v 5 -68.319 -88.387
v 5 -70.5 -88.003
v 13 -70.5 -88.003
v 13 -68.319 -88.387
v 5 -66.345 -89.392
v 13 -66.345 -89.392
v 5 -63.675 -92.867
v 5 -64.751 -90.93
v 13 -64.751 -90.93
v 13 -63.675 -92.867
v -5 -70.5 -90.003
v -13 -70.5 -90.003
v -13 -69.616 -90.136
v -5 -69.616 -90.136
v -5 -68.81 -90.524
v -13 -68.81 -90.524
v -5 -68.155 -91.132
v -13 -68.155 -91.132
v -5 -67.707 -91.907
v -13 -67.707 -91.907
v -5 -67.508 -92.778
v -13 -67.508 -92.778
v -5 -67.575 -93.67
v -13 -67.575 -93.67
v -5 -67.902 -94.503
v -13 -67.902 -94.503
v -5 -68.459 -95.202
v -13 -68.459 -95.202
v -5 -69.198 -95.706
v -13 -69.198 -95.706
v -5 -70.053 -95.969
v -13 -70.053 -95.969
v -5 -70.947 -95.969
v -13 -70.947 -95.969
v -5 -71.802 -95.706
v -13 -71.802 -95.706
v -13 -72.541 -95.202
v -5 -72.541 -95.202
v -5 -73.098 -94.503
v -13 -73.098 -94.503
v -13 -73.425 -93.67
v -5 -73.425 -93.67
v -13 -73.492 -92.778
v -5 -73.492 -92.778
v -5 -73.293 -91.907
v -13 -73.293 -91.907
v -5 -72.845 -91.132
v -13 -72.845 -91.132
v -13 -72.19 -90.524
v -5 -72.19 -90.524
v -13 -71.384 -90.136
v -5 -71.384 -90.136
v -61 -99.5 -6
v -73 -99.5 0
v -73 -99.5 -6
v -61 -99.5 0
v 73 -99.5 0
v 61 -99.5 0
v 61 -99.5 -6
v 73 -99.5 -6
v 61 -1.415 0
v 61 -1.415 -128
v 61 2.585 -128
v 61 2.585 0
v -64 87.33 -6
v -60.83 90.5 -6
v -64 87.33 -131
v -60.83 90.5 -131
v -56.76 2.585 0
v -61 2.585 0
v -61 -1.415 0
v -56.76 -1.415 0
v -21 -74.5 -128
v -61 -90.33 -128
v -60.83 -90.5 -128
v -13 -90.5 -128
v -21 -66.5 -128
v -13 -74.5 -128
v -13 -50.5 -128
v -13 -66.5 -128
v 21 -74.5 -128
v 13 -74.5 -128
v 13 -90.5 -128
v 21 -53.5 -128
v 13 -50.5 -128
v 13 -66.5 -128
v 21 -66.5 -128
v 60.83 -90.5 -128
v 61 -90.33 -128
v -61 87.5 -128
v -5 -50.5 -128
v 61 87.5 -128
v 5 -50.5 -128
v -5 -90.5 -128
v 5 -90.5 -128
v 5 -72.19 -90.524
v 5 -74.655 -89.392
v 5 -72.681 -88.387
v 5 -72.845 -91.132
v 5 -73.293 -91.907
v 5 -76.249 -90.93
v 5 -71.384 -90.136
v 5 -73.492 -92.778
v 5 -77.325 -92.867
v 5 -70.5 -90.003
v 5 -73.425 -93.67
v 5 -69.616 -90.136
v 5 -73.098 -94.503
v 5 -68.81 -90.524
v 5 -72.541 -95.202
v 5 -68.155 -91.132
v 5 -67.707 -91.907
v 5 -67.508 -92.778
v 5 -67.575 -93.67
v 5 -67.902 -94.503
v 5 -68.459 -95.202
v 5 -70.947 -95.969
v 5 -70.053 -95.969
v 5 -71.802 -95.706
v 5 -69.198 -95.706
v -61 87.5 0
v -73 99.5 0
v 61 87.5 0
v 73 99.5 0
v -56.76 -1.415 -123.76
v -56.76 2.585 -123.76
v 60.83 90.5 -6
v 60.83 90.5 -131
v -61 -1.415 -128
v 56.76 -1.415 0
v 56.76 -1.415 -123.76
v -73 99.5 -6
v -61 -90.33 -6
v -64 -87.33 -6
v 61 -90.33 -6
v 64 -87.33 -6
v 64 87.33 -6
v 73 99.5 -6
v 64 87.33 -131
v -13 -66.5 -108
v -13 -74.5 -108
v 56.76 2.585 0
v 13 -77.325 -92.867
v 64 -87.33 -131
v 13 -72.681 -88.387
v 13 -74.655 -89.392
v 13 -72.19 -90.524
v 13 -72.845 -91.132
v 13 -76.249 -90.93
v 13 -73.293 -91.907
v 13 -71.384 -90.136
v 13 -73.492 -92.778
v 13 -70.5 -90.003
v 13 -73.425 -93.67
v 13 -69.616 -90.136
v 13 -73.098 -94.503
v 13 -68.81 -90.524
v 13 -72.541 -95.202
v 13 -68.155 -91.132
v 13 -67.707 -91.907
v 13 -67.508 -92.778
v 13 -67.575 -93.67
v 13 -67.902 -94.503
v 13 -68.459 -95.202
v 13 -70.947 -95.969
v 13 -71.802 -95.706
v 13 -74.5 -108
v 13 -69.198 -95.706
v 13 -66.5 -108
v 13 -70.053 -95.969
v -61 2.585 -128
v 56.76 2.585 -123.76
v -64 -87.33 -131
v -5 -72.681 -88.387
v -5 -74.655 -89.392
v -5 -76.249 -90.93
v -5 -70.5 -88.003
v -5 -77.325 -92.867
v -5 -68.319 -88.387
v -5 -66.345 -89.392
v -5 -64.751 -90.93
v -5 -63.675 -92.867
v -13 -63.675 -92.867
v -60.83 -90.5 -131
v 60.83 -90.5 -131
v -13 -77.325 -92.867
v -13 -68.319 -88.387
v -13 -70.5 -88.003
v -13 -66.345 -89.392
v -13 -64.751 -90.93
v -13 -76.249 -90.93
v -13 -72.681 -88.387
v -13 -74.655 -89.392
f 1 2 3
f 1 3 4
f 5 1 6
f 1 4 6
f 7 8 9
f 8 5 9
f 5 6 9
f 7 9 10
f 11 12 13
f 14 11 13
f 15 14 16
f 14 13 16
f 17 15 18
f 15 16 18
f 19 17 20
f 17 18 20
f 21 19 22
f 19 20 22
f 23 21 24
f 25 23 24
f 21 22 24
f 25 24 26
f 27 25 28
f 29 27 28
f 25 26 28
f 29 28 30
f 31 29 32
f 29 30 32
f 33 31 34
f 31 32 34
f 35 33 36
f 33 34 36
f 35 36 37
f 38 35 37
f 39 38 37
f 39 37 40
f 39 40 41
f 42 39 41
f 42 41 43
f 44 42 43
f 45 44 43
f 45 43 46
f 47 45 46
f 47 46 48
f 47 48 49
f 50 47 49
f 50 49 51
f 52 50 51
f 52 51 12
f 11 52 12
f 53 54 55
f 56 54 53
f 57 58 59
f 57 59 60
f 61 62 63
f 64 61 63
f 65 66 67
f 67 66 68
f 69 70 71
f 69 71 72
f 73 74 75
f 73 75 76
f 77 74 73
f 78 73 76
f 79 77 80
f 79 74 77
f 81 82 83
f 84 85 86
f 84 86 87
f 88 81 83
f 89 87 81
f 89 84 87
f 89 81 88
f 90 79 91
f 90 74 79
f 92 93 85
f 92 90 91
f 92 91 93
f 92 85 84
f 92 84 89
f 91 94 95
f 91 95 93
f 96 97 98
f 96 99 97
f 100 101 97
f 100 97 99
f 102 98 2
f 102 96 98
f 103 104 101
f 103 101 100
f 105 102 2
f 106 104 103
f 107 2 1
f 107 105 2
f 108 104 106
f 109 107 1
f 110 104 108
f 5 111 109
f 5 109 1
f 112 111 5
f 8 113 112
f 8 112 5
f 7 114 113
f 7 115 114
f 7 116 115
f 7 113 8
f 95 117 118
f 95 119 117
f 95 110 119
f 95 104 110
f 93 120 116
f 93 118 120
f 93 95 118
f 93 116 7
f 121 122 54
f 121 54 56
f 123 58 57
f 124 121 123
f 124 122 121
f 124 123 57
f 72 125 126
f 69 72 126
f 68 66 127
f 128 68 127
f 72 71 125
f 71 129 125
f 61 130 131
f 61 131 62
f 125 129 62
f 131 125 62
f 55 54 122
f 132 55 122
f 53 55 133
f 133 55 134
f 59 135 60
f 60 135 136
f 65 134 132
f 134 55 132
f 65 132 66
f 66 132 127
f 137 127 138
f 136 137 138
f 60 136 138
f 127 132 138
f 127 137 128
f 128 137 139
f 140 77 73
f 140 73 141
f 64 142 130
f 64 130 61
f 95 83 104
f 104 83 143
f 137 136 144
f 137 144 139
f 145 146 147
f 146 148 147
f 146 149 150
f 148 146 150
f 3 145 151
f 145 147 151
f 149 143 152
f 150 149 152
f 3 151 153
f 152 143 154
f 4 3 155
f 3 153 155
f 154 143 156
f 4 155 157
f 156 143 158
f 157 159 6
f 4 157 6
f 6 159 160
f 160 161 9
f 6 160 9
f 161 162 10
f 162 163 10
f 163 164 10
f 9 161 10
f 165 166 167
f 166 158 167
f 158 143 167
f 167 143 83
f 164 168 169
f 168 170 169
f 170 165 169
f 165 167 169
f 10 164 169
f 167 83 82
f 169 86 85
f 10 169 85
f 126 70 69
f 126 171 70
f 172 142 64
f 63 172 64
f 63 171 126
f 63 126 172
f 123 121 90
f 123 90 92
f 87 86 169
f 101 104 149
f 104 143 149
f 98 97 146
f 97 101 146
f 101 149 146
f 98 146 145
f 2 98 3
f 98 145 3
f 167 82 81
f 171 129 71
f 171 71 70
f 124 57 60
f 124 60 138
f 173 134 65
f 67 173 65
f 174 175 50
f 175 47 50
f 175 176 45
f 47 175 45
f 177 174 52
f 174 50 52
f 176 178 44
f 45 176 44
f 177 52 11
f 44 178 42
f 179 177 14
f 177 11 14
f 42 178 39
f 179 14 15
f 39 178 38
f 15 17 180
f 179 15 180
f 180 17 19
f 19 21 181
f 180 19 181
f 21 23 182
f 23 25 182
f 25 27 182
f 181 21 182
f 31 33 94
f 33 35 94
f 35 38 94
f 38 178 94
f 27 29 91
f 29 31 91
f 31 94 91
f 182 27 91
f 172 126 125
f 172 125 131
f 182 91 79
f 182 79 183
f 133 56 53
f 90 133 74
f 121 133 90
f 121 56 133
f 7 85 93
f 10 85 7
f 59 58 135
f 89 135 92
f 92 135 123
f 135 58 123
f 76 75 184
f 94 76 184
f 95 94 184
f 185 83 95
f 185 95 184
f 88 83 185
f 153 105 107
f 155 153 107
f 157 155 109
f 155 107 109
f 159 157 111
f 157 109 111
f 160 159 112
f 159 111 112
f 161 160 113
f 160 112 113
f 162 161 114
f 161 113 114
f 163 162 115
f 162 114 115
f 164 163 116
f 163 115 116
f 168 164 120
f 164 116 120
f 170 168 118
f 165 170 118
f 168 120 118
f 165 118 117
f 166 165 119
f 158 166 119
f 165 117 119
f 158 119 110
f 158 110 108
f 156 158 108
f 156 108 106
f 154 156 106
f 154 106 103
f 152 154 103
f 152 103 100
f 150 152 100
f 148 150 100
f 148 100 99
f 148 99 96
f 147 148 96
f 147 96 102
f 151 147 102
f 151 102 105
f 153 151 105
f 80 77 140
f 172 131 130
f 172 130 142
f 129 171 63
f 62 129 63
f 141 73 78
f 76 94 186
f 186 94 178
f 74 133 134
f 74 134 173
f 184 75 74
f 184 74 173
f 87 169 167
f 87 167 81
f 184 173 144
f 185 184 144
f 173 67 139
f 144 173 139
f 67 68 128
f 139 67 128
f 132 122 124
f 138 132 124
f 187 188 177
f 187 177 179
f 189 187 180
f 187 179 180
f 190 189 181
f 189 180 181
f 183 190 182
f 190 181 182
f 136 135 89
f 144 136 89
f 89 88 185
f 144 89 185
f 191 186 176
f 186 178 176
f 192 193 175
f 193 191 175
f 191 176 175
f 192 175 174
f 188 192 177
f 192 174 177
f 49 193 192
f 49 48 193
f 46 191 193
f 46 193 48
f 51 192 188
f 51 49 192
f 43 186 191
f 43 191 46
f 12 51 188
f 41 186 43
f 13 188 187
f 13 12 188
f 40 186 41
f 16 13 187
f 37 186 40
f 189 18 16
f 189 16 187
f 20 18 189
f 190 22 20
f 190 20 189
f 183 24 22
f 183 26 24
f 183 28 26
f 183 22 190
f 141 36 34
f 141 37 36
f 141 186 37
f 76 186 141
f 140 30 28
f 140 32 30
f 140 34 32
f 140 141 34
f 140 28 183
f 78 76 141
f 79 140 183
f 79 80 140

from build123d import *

# Parameters (mm, degrees)
ESQUISSE3_W                  = 128
ESQUISSE3_H                  = 181
BOSS_EXTRU_4_DEPTH           = 131
COQUE2_T                     = -3
CHANFREIN1_SIZE              = 3.17
ESQUISSE4_W                  = 146
ESQUISSE4_H                  = 199
BOSS_EXTRU_5_DEPTH           = 6
ESQUISSE5_W                  = 122
ESQUISSE5_H                  = 9.17
ENL_V_MAT_EXTRU_1_DEPTH      = 6
ESQUISSE6_W                  = 8
ESQUISSE6_H                  = 40
BOSS_EXTRU_6_DEPTH           = 40
ENL_V_MAT_EXTRU_2_DEPTH      = 26
CONG_2_R                     = 7.5
ENL_V_MAT_EXTRU_3_REACH      = 187.627
ESQUISSE8_R                  = 3
ESQUISSE9_W                  = 122
ESQUISSE9_H                  = 4
BOSS_EXTRU_7_DEPTH           = 128
COQUE3_T                     = -4.24
ESQUISSE10_W                 = 8
ESQUISSE10_H                 = 8
BOSS_EXTRU_8_DEPTH           = 20
ENL_V_MAT_EXTRU_4_DEPTH      = 230.708510944
ENL_V_MAT_EXTRU_4_DEPTH_BACK = 21
ESQUISSE12_W                 = 8
ESQUISSE12_H                 = 8
BOSS_EXTRU_9_DEPTH           = 20
ENL_V_START                  = -8
ENL_V_MAT_EXTRU_6_DEPTH      = 8


# Read off the part's stored shape, not the designer's step: Enlèv. mat.-Extru.6
with BuildPart() as part:
    # Esquisse3 → Boss.-Extru.4 (new body)
    with BuildSketch(Plane.XY):
        Rectangle(ESQUISSE3_W, ESQUISSE3_H)
    extrude(amount=-BOSS_EXTRU_4_DEPTH)

    # Coque2
    coque2_openings = [part.faces().sort_by_distance(p)[0] for p in [
        (0, 0, 0),
        (0, -90.5, -65.5),
    ]]
    offset(amount=COQUE2_T, openings=coque2_openings, kind=Kind.INTERSECTION)

    # Chanfrein1
    chanfrein1_edges = [part.edges().sort_by_distance(p)[0] for p in [
        (64, -90.5, -65.5),
        (-64, -90.5, -65.5),
        (-64, 90.5, -65.5),
        (64, 90.5, -65.5),
    ]]
    chamfer(chanfrein1_edges, length=CHANFREIN1_SIZE)

    # Esquisse4 → Boss.-Extru.5 (add)
    with BuildSketch(Plane.XY):
        Rectangle(ESQUISSE4_W, ESQUISSE4_H)
        Polygon((-64, 87.33), (-60.83, 90.5), (60.83, 90.5), (64, 87.33), (64, -87.33), (61, -90.33), (-61, -90.33), (-64, -87.33), align=None, mode=Mode.SUBTRACT)
    extrude(amount=-BOSS_EXTRU_5_DEPTH)

    # Esquisse5 → Enlèv. mat.-Extru.1 (cut)
    with BuildSketch(Plane.XY):
        with Locations((0, -94.915)):
            Rectangle(ESQUISSE5_W, ESQUISSE5_H)
    extrude(amount=-ENL_V_MAT_EXTRU_1_DEPTH, mode=Mode.SUBTRACT)

    # Esquisse6 → Boss.-Extru.6 (add)
    with BuildSketch(Plane.XY.offset(-128)):
        with Locations((9, -70.5)):
            Rectangle(ESQUISSE6_W, ESQUISSE6_H)
        with Locations((-9, -70.5)):
            Rectangle(ESQUISSE6_W, ESQUISSE6_H)
    extrude(amount=BOSS_EXTRU_6_DEPTH)

    # Esquisse7 → Enlèv. mat.-Extru.2 (cut)
    with BuildSketch(Plane(origin=(13, 0, 0), x_dir=(0, 0, -1), z_dir=(1, 0, 0))):
        Polygon((128, -50.5), (88, -65.5), (88, -50.5), align=None)
        Polygon((128, -90.5), (88, -75.5), (88, -90.5), align=None)
    extrude(amount=-ENL_V_MAT_EXTRU_2_DEPTH, mode=Mode.SUBTRACT)

    # Congé2
    # the kernel refuses this fillet: 7.5 mm, written as the material it takes off along each edge
    with BuildSketch(Plane(origin=(25.993758778, -75.5, -88), x_dir=(0, -0.3511234415883899, -0.9363291775690452), z_dir=(-1, 0, 0)), Plane(origin=(7.993758778, -75.5, -88), x_dir=(0, -0.3511234415883899, -0.9363291775690452), z_dir=(-1, 0, 0))) as cong_2_piece_1:
        with BuildLine():
            CenterArc((CONG_2_R * 0.693000468165, -CONG_2_R), CONG_2_R, 90, 69.44395478)
            Line((-CONG_2_R * 0.243328709404, -CONG_2_R * 0.648876558412), (0, 0))
            Line((0, 0), (CONG_2_R * 0.693000468165, 0))
        make_face()
    extrude(amount=33.987517556, mode=Mode.SUBTRACT)
    with BuildSketch(Plane(origin=(7.993758778, -65.5, -88), x_dir=(0, 0.3511234415883905, -0.936329177569045), z_dir=(-1, 0, 0)), Plane(origin=(25.993758778, -65.5, -88), x_dir=(0, 0.3511234415883905, -0.936329177569045), z_dir=(-1, 0, 0))) as cong_2_piece_2:
        with BuildLine():
            CenterArc((CONG_2_R * 0.693000468165, CONG_2_R), CONG_2_R, 200.55604522, 69.44395478)
            Line((-CONG_2_R * 0.243328709404, CONG_2_R * 0.648876558412), (0, 0))
            Line((0, 0), (CONG_2_R * 0.693000468165, 0))
        make_face()
    extrude(amount=33.987517556, mode=Mode.SUBTRACT)

    # Enlèv. mat.-Extru.3: up to this face of the body (flat: up to its plane)
    enl_v_mat_extru_3_end = Plane(part.part.faces().sort_by_distance((13, -70.5, -112.226918248))[0])
    # Esquisse8 → Enlèv. mat.-Extru.3 (cut, up to the picked face)
    with BuildSketch(Plane.ZY.offset(13), mode=Mode.PRIVATE) as enl_v_mat_extru_3_sk1:
        with Locations((-93.00260096, -70.5)):
            Circle(ESQUISSE8_R)
    enl_v_mat_extru_3_tool1 = split(extrude(enl_v_mat_extru_3_sk1.sketch, amount=-ENL_V_MAT_EXTRU_3_REACH, mode=Mode.PRIVATE), bisect_by=enl_v_mat_extru_3_end, keep=Keep.BOTH, mode=Mode.PRIVATE)
    add(enl_v_mat_extru_3_tool1.solids().sort_by(Axis((-13, -70.5, -93.002601), (1, 0, 0)))[0], mode=Mode.SUBTRACT)

    # Esquisse10 → Boss.-Extru.8 (add)
    with BuildSketch(Plane.XY.offset(-128)):
        with Locations((17, -70.5)):
            Rectangle(ESQUISSE10_W, ESQUISSE10_H)
    extrude(amount=BOSS_EXTRU_8_DEPTH)

    # Esquisse11 → Enlèv. mat.-Extru.4 (cut, two sides: drawn at the far end of the back side and taken through both)
    with BuildSketch(Plane.XZ.offset(74.5).offset(-ENL_V_MAT_EXTRU_4_DEPTH_BACK)):
        Polygon((21, -108), (13, -108), (21, -128), align=None)
    extrude(amount=ENL_V_MAT_EXTRU_4_DEPTH + ENL_V_MAT_EXTRU_4_DEPTH_BACK, mode=Mode.SUBTRACT)

    # Esquisse12 → Boss.-Extru.9 (add)
    with BuildSketch(Plane.XY.offset(-128)):
        with Locations((-17, -70.5)):
            Rectangle(ESQUISSE12_W, ESQUISSE12_H)
    extrude(amount=BOSS_EXTRU_9_DEPTH)

    # Enlèv. mat.-Extru.6 outline → Enlèv. mat.-Extru.6 (cut)
    with BuildSketch(Plane.XZ.offset(74.5).offset(ENL_V_START)):
        Polygon((-21, -108), (-21, -128), (-13, -108), align=None)
    extrude(amount=ENL_V_MAT_EXTRU_6_DEPTH, mode=Mode.SUBTRACT)


with BuildPart() as body_2:
    # Esquisse9 → Boss.-Extru.7 (new body)
    with BuildSketch(Plane.XY.offset(-128)):
        with Locations((0, 0.585)):
            Rectangle(ESQUISSE9_W, ESQUISSE9_H)
    extrude(amount=BOSS_EXTRU_7_DEPTH)

    # Coque3
    coque3_openings = [body_2.faces().sort_by_distance(p)[0] for p in [
        (0, 0.585, 0),
        (0, 2.585, -64),
        (0, -1.415, -64),
    ]]
    offset(amount=COQUE3_T, openings=coque3_openings, kind=Kind.INTERSECTION)


solid = Compound([part.part, body_2.part])
